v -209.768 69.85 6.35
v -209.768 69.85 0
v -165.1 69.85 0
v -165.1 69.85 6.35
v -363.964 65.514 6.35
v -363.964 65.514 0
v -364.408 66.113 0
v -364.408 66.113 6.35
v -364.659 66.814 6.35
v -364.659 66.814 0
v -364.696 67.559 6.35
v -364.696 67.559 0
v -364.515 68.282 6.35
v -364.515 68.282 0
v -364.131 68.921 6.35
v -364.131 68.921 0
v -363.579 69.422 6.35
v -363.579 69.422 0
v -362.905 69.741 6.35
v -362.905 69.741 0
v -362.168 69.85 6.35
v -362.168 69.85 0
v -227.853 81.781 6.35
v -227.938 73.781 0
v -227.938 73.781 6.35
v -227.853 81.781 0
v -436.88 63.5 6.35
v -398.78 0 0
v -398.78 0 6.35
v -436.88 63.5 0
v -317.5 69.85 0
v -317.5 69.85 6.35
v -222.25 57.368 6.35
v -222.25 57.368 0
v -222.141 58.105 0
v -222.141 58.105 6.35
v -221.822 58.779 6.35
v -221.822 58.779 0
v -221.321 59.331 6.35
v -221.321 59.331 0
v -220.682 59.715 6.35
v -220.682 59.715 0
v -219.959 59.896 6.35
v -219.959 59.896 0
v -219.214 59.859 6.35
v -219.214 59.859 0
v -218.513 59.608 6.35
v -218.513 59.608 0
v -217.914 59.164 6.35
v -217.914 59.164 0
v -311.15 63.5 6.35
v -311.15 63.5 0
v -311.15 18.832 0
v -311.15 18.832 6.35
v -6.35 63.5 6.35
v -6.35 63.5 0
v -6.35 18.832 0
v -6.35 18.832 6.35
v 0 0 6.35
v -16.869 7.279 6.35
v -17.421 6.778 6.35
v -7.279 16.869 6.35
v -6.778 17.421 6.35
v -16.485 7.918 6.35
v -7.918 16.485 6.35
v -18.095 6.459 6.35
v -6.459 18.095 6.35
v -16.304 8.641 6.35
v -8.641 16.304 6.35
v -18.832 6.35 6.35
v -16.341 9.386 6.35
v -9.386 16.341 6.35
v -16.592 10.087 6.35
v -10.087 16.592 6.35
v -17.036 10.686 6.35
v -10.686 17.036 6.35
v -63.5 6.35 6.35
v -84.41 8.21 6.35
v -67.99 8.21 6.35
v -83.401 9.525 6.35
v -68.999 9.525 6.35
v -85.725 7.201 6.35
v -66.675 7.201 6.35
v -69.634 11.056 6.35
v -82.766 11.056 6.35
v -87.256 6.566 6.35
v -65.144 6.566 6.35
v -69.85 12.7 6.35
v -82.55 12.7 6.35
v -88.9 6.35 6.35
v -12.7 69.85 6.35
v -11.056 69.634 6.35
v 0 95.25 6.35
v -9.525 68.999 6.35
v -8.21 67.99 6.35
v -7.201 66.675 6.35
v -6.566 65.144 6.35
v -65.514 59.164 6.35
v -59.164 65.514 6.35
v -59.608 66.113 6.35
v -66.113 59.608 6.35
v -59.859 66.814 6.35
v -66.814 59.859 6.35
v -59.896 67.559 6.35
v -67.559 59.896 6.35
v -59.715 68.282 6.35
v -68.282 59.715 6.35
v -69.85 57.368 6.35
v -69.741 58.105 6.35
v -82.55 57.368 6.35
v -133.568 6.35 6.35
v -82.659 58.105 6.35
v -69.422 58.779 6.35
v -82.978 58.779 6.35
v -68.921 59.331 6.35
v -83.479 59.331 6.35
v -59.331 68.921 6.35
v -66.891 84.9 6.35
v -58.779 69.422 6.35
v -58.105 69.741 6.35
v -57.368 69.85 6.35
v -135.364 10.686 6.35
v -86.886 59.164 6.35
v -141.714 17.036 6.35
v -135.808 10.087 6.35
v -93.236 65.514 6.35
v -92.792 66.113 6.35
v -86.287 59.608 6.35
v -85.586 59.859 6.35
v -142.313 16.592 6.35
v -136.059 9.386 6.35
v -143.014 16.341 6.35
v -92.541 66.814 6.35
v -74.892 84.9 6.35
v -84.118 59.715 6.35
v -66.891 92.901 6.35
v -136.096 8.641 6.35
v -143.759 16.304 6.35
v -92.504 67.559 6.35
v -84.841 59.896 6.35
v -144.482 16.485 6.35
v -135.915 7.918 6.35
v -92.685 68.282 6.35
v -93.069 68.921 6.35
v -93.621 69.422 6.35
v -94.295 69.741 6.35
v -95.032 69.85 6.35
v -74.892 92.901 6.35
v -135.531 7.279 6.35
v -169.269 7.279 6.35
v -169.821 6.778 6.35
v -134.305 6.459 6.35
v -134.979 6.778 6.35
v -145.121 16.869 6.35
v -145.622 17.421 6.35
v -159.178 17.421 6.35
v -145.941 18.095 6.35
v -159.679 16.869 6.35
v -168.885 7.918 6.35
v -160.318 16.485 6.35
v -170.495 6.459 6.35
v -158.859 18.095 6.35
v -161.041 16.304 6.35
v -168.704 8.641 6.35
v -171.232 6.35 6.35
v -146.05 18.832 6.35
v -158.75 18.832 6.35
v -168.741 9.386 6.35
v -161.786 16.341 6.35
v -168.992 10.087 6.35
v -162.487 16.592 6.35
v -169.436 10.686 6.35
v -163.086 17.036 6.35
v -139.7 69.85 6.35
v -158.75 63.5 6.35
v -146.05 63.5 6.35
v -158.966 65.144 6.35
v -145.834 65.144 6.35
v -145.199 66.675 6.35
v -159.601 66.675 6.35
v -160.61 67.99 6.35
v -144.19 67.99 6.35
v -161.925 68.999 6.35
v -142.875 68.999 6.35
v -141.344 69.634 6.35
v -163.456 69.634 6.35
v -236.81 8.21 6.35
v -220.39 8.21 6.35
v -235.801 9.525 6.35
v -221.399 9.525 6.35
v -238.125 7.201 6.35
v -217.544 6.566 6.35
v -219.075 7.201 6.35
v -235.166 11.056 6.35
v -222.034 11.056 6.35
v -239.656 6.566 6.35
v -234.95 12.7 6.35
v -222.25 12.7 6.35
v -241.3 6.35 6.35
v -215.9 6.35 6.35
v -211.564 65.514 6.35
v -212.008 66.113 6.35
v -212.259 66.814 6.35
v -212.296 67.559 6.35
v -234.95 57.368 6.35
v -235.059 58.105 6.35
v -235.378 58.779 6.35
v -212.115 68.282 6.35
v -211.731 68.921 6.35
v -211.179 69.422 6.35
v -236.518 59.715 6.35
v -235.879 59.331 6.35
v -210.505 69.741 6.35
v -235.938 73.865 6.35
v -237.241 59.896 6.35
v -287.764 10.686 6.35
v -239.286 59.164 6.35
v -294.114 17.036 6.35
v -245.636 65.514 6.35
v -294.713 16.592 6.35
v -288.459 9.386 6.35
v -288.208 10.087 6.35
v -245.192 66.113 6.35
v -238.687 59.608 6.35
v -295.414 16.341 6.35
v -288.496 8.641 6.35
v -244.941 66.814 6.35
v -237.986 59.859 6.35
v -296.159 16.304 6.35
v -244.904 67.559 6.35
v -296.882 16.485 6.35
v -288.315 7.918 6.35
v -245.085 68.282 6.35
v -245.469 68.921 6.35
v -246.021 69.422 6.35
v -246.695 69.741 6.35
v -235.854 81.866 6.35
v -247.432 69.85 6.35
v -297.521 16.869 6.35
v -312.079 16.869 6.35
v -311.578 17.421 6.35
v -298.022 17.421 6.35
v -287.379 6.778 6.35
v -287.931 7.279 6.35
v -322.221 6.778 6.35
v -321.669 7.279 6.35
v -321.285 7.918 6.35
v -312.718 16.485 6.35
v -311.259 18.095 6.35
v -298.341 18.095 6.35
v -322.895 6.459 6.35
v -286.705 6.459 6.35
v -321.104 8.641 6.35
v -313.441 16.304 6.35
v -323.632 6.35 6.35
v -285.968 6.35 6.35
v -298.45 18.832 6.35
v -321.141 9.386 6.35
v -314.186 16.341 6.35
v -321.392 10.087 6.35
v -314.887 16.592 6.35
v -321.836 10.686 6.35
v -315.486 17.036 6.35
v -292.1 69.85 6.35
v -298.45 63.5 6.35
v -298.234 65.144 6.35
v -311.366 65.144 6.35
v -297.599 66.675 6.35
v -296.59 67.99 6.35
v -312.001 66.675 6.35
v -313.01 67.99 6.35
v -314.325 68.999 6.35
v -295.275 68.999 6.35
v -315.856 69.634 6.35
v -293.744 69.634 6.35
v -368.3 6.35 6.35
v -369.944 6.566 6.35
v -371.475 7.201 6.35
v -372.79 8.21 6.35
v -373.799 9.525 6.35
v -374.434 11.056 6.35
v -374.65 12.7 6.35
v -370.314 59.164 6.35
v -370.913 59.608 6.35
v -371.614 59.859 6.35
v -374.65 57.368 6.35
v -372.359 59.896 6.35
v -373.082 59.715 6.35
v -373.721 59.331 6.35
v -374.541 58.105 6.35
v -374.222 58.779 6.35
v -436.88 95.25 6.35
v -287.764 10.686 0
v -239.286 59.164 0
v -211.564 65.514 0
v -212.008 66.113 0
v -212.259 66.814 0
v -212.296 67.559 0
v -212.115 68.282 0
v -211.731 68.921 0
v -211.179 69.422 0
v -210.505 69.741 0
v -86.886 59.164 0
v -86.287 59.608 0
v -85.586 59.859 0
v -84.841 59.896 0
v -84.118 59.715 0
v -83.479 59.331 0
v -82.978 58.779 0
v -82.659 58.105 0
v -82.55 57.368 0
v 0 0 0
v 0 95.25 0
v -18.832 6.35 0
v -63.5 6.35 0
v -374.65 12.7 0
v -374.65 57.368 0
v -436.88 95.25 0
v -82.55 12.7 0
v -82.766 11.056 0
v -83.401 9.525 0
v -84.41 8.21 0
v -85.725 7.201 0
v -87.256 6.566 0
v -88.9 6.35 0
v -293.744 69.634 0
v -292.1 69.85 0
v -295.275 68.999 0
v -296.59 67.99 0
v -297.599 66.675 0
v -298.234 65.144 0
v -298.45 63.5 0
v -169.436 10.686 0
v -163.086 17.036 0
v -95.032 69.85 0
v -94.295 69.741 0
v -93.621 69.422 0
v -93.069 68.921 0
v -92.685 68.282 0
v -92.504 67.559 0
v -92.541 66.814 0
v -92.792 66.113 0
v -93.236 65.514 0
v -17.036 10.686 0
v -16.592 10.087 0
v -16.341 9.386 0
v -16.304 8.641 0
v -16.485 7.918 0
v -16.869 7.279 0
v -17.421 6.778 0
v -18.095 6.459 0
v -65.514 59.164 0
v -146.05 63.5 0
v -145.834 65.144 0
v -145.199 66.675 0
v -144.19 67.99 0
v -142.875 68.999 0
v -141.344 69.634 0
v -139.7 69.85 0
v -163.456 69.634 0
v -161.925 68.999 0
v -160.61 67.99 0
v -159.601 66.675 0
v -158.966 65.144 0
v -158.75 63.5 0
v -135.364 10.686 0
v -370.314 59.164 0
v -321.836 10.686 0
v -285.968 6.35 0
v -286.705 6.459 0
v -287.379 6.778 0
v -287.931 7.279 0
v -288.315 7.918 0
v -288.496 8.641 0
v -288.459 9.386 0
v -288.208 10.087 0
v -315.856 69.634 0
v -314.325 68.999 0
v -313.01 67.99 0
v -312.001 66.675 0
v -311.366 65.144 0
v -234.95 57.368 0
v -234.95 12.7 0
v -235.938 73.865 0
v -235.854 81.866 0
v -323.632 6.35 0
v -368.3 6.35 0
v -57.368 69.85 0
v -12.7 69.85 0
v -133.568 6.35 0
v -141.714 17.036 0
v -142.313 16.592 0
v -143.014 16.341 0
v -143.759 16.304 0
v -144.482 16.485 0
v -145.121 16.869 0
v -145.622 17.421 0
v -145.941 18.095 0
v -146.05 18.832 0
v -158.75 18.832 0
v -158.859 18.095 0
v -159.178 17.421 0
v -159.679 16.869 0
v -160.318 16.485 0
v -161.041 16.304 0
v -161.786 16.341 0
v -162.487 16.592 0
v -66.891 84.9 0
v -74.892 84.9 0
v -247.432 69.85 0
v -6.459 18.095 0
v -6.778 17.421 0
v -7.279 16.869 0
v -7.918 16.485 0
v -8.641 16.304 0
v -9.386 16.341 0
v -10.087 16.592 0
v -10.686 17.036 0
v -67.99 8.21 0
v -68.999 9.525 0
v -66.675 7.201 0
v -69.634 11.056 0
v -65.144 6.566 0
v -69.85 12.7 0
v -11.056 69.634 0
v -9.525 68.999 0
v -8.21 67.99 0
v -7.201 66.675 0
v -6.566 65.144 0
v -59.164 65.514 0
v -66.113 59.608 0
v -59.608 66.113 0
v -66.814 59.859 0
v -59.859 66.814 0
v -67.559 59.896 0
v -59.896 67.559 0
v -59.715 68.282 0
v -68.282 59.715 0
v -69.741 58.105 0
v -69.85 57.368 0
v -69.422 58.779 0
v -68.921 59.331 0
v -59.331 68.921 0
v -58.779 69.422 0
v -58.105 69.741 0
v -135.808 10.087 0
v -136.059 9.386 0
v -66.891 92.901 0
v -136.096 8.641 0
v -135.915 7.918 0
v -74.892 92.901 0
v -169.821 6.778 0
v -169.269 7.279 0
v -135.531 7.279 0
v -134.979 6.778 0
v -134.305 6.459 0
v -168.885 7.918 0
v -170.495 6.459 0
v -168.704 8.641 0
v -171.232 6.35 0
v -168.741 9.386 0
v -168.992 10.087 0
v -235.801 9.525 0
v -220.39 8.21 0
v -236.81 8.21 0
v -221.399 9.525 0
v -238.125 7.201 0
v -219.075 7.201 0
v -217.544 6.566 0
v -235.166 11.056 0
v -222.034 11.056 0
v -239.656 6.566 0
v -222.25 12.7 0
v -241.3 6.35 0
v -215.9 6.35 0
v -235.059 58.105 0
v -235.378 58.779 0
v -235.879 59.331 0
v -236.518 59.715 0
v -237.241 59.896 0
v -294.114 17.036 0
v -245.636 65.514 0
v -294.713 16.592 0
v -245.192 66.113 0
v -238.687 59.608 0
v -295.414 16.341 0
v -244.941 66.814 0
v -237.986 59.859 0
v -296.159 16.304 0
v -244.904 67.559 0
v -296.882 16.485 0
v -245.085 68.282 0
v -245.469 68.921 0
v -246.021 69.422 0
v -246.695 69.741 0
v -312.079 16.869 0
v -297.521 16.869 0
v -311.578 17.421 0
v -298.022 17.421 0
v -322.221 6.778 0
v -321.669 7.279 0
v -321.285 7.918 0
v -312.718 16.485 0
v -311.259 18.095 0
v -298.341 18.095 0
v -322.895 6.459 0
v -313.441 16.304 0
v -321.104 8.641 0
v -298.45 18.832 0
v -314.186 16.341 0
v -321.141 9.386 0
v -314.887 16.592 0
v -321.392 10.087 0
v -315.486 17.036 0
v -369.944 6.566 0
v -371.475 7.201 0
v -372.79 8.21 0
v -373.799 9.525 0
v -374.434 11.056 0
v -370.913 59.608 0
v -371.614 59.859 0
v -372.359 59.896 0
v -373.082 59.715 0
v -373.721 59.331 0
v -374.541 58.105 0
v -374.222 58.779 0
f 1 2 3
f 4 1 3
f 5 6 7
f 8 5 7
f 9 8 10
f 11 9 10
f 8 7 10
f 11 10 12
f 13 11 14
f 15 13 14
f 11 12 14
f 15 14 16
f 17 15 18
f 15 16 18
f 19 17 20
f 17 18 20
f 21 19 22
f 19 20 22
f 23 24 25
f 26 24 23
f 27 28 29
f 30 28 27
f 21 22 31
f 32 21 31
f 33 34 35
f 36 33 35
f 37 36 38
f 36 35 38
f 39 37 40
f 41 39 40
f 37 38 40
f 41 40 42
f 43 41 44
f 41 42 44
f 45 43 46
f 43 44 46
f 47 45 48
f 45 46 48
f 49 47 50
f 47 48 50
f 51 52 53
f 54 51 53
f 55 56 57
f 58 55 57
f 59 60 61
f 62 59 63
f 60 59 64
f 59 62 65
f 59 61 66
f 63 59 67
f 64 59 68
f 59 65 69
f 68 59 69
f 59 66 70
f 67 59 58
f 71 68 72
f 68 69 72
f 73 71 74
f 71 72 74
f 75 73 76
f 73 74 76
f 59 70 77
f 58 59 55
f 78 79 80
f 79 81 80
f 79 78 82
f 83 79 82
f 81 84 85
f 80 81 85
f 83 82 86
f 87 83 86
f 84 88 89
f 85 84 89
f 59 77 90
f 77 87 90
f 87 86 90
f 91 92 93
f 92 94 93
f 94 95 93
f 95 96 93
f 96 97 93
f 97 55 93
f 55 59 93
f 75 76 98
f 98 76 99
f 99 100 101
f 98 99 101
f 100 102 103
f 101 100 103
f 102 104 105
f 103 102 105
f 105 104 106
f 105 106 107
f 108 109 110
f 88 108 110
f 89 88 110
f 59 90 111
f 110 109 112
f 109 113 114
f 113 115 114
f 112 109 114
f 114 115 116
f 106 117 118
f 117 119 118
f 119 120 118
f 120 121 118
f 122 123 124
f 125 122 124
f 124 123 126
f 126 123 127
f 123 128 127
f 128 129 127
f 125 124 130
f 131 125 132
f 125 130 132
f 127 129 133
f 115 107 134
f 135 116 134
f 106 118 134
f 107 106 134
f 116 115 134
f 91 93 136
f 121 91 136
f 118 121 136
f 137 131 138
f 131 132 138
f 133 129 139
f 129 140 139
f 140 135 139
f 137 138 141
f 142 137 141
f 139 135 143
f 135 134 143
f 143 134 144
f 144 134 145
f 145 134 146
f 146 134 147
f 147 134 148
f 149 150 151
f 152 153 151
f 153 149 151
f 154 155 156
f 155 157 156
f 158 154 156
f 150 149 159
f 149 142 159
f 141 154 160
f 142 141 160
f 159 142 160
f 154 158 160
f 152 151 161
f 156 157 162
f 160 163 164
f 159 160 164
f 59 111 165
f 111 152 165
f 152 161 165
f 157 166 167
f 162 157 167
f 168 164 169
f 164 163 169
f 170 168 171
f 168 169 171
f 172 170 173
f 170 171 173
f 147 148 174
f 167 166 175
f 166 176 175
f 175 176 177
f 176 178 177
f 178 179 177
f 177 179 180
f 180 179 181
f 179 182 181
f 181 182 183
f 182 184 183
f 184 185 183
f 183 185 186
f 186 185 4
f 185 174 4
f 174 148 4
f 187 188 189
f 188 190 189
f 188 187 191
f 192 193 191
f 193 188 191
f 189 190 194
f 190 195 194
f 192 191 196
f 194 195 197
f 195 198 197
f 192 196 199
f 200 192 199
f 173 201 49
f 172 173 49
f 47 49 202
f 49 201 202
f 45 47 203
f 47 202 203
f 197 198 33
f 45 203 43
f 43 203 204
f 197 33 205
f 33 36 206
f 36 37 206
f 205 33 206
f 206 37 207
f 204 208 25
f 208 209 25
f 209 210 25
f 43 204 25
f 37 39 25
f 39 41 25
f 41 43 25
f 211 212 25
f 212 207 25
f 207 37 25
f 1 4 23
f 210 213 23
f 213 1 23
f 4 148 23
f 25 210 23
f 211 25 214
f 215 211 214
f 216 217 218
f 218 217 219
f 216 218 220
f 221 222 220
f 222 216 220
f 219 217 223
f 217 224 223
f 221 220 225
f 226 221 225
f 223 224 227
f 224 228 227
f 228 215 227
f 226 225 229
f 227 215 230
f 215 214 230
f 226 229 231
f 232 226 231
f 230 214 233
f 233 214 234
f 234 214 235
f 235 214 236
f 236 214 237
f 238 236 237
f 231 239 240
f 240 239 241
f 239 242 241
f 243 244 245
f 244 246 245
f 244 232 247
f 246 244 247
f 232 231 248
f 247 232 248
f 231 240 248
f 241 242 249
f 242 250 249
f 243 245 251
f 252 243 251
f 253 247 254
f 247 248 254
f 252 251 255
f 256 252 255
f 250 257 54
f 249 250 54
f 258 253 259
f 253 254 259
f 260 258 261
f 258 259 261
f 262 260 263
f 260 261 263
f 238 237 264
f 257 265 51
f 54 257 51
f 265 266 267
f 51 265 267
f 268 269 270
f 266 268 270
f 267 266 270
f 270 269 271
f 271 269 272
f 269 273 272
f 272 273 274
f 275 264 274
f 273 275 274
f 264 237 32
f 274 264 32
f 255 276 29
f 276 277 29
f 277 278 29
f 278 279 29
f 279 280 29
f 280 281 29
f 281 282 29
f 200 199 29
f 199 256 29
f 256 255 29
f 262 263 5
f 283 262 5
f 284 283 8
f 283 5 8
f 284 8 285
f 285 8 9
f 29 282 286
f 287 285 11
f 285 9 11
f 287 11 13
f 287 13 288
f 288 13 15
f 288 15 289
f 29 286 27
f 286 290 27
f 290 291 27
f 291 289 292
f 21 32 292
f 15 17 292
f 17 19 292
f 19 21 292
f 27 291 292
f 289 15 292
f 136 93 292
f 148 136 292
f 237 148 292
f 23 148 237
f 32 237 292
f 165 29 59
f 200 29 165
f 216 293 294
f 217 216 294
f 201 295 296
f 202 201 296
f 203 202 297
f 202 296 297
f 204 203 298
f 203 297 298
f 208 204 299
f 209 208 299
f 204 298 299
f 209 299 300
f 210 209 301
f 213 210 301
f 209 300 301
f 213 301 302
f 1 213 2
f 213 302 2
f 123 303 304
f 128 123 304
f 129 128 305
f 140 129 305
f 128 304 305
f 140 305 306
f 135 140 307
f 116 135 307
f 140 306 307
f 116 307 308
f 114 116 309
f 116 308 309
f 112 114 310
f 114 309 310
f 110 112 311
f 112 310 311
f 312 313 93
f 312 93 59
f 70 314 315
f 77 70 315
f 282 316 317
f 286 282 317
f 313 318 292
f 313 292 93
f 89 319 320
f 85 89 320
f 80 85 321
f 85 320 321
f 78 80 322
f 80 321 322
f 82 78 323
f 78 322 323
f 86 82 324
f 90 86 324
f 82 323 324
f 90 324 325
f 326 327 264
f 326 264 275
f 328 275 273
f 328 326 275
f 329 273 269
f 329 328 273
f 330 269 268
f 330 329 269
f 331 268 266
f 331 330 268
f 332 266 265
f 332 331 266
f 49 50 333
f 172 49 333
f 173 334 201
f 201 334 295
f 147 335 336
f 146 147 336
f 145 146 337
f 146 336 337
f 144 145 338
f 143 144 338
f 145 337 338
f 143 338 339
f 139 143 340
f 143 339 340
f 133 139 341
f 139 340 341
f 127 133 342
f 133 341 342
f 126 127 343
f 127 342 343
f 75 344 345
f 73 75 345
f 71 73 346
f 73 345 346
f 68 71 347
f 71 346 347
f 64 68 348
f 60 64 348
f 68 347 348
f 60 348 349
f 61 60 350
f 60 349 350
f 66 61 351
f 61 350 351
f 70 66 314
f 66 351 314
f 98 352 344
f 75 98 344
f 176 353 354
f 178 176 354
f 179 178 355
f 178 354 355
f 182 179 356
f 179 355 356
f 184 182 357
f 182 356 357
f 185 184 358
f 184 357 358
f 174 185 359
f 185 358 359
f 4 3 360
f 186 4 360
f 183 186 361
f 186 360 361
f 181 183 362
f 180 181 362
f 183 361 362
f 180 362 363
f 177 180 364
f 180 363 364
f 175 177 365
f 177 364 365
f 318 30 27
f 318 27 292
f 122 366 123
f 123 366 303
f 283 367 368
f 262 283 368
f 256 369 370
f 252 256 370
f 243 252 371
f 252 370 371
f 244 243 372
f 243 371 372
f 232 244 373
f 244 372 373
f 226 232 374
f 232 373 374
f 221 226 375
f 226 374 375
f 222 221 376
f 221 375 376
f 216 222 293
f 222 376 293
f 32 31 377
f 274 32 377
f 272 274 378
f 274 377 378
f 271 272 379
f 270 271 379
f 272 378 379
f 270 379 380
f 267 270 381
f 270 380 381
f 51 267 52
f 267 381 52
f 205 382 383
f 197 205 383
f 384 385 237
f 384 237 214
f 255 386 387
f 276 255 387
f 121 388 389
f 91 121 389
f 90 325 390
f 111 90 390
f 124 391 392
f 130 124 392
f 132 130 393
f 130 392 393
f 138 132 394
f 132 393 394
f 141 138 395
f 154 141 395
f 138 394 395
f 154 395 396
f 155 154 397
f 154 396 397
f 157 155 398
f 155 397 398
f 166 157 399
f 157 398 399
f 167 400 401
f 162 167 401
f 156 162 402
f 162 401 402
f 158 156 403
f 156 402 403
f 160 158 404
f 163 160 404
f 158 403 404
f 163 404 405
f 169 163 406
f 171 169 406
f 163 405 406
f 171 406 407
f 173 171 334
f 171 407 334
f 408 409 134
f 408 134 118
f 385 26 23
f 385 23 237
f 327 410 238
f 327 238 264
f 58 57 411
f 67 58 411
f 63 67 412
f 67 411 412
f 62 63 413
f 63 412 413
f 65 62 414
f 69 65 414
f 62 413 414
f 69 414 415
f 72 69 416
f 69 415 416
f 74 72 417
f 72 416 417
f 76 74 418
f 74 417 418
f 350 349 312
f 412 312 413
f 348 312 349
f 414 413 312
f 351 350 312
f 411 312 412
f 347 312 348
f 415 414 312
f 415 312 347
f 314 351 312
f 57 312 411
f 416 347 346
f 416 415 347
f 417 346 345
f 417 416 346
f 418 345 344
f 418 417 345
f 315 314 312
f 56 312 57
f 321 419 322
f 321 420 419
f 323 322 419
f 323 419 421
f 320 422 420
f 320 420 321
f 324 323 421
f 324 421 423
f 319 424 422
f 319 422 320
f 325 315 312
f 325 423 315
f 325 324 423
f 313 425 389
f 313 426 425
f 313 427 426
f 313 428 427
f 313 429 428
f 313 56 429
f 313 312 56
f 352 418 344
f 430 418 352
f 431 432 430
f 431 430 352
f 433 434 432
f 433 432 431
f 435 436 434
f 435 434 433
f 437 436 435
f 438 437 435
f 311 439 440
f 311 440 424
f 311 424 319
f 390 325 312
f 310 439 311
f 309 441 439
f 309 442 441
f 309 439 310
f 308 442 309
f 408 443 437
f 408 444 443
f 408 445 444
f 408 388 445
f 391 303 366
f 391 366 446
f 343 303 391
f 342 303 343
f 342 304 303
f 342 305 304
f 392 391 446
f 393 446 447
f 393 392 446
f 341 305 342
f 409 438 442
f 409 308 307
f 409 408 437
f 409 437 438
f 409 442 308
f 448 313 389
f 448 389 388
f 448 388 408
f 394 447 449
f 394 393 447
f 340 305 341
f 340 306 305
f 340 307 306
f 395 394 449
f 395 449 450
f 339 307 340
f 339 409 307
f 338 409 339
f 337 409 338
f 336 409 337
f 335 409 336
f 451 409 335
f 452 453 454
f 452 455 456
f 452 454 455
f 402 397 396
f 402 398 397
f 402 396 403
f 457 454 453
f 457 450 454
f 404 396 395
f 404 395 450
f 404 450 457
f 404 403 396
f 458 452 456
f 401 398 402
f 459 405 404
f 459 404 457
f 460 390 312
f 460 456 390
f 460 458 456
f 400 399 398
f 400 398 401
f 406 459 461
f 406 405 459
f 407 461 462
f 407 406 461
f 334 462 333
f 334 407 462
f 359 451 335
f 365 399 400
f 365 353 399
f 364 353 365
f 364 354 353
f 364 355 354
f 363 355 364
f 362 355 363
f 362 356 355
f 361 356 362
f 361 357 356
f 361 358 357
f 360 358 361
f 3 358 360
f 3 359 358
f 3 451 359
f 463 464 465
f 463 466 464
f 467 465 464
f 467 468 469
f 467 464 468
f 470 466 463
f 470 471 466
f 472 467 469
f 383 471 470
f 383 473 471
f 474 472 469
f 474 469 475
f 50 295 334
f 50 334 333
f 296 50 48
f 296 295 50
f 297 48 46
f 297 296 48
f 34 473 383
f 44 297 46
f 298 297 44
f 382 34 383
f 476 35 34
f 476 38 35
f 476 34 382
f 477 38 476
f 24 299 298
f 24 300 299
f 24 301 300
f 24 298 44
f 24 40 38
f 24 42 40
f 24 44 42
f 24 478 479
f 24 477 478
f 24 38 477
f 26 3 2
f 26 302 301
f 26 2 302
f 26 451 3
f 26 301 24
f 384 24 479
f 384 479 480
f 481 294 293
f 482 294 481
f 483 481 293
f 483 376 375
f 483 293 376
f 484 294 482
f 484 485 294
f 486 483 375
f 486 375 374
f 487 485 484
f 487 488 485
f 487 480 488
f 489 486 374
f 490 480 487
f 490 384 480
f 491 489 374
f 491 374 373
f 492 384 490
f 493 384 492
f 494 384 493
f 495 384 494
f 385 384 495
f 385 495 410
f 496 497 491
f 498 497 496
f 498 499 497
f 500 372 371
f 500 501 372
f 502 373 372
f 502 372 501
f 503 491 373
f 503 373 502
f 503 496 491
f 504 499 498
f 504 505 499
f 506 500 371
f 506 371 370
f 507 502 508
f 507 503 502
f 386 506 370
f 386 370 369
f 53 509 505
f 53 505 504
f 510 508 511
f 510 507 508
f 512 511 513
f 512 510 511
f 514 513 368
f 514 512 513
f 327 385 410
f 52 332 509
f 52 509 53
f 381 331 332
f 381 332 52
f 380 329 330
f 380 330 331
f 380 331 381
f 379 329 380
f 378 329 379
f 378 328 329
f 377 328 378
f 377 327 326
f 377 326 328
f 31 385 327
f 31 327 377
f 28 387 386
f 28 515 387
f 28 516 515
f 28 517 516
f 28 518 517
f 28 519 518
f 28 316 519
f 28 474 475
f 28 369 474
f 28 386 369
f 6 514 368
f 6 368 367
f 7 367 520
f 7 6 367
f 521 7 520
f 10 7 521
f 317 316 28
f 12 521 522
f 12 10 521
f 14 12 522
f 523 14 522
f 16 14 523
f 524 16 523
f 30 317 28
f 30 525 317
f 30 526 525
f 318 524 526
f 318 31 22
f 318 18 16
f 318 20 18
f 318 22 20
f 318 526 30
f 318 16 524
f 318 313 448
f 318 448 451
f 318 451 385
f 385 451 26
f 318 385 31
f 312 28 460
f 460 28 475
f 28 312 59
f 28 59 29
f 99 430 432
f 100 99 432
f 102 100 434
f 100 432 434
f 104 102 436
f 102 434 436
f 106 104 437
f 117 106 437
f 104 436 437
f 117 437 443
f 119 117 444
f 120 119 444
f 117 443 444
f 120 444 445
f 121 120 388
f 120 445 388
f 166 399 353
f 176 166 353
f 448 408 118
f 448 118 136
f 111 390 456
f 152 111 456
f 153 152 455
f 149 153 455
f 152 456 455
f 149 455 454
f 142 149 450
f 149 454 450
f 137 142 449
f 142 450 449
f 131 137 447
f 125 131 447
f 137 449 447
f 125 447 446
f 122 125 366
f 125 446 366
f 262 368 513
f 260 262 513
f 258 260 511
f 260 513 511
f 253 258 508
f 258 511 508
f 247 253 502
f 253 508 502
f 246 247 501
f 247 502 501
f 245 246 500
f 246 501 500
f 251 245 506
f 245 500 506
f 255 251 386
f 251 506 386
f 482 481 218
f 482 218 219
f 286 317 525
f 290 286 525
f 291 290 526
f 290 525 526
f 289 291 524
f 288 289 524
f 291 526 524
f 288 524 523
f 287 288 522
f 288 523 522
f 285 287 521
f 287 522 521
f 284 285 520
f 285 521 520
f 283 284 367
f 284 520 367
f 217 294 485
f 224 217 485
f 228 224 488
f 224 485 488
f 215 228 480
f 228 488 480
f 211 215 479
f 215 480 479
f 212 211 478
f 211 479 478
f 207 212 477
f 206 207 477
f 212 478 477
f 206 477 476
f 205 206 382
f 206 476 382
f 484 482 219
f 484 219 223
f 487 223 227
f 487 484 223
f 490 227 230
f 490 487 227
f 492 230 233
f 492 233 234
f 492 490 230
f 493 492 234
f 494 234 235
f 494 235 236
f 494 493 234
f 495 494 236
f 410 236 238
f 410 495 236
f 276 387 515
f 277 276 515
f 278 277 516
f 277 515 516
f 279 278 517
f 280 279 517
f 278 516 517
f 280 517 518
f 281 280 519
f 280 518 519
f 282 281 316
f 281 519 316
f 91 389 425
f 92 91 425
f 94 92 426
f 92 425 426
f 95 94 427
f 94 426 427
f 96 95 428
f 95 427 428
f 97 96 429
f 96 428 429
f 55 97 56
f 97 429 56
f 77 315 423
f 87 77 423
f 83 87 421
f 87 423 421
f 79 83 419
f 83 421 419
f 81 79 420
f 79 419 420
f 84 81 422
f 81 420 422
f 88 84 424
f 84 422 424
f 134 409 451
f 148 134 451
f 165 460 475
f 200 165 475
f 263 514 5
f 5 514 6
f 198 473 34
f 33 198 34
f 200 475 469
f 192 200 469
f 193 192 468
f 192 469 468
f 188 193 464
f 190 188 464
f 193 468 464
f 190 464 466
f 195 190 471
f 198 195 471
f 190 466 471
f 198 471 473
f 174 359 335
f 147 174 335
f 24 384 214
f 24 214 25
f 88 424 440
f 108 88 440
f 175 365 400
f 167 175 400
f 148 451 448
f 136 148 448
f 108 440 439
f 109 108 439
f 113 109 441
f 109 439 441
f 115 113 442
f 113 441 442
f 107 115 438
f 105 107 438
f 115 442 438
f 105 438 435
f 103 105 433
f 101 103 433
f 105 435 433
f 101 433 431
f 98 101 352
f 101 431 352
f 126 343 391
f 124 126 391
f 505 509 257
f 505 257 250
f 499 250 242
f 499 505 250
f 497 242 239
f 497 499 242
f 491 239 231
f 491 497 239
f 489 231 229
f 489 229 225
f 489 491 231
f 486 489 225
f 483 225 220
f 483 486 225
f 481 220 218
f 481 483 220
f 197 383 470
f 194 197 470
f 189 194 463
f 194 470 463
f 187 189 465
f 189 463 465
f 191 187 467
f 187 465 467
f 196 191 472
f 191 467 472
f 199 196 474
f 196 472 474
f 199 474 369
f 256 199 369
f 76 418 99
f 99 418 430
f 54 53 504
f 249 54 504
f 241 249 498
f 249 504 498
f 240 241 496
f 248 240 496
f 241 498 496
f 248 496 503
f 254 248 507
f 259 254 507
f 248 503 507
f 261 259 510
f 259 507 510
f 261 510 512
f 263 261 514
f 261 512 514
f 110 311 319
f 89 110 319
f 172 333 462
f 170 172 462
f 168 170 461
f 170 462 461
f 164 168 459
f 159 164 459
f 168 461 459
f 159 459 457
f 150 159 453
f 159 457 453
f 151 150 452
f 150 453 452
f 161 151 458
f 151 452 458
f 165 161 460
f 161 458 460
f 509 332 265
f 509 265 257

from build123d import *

# Parameters (mm, degrees)
MODEL_W             = 8.001
MODEL_H             = 8.001
BOSS_EXTRUDE1_DEPTH = 6.35


with BuildPart() as part:
    # Model → Boss-Extrude1 (new body)
    with BuildSketch(Plane.XY):
        Polygon((-398.78, 0), (-436.88, 63.5), (-436.88, 95.25), (0, 95.25), (0, 0), align=None)
        with Locations((-70.891200524, 88.9)):
            Rectangle(MODEL_W, MODEL_H, mode=Mode.SUBTRACT)
        Polygon((-235.938184475, 73.86541105), (-227.937630461, 73.78093355), (-227.853152962, 81.781487564), (-235.853706976, 81.865965064), align=None, mode=Mode.SUBTRACT)
        with BuildLine():
            Line((-171.232102448, 6.35), (-215.9, 6.35))
            ThreePointArc((-215.9, 6.35), (-220.390128061, 8.209871939), (-222.25, 12.7))
            Line((-222.25, 12.7), (-222.25, 57.367897552))
            ThreePointArc((-222.25, 57.367897552), (-220.682015918, 59.714551564), (-217.913948776, 59.163948776))
            Line((-217.913948776, 59.163948776), (-169.436051224, 10.686051224))
            ThreePointArc((-169.436051224, 10.686051224), (-168.885448436, 7.917984082), (-171.232102448, 6.35))
        make_face(mode=Mode.SUBTRACT)
        with BuildLine():
            Line((-234.95, 57.367897552), (-234.95, 12.7))
            ThreePointArc((-234.95, 12.7), (-236.809871939, 8.209871939), (-241.3, 6.35))
            Line((-241.3, 6.35), (-285.967897552, 6.35))
            ThreePointArc((-285.967897552, 6.35), (-288.314551564, 7.917984082), (-287.763948776, 10.686051224))
            Line((-287.763948776, 10.686051224), (-239.286051224, 59.163948776))
            ThreePointArc((-239.286051224, 59.163948776), (-236.517984082, 59.714551564), (-234.95, 57.367897552))
        make_face(mode=Mode.SUBTRACT)
        with BuildLine():
            Line((-294.113948776, 17.036051224), (-245.636051224, 65.513948776))
            ThreePointArc((-245.636051224, 65.513948776), (-245.085448436, 68.282015918), (-247.432102448, 69.85))
            Line((-247.432102448, 69.85), (-292.1, 69.85))
            ThreePointArc((-292.1, 69.85), (-296.590128061, 67.990128061), (-298.45, 63.5))
            Line((-298.45, 63.5), (-298.45, 18.832102448))
            ThreePointArc((-298.45, 18.832102448), (-296.882015918, 16.485448436), (-294.113948776, 17.036051224))
        make_face(mode=Mode.SUBTRACT)
        with BuildLine():
            Line((-323.632102448, 6.35), (-368.3, 6.35))
            ThreePointArc((-368.3, 6.35), (-372.790128061, 8.209871939), (-374.65, 12.7))
            Line((-374.65, 12.7), (-374.65, 57.367897552))
            ThreePointArc((-374.65, 57.367897552), (-373.082015918, 59.714551564), (-370.313948776, 59.163948776))
            Line((-370.313948776, 59.163948776), (-321.836051224, 10.686051224))
            ThreePointArc((-321.836051224, 10.686051224), (-321.285448436, 7.917984082), (-323.632102448, 6.35))
        make_face(mode=Mode.SUBTRACT)
        with BuildLine():
            Line((-18.832102448, 6.35), (-63.5, 6.35))
            ThreePointArc((-63.5, 6.35), (-67.990128061, 8.209871939), (-69.85, 12.7))
            Line((-69.85, 12.7), (-69.85, 57.367897552))
            ThreePointArc((-69.85, 57.367897552), (-68.282015918, 59.714551564), (-65.513948776, 59.163948776))
            Line((-65.513948776, 59.163948776), (-17.036051224, 10.686051224))
            ThreePointArc((-17.036051224, 10.686051224), (-16.485448436, 7.917984082), (-18.832102448, 6.35))
        make_face(mode=Mode.SUBTRACT)
        with BuildLine():
            Line((-82.55, 57.367897552), (-82.55, 12.7))
            ThreePointArc((-82.55, 12.7), (-84.409871939, 8.209871939), (-88.9, 6.35))
            Line((-88.9, 6.35), (-133.567897552, 6.35))
            ThreePointArc((-133.567897552, 6.35), (-135.914551564, 7.917984082), (-135.363948776, 10.686051224))
            Line((-135.363948776, 10.686051224), (-86.886051224, 59.163948776))
            ThreePointArc((-86.886051224, 59.163948776), (-84.117984082, 59.714551564), (-82.55, 57.367897552))
        make_face(mode=Mode.SUBTRACT)
        with BuildLine():
            Line((-93.236051224, 65.513948776), (-141.713948776, 17.036051224))
            ThreePointArc((-141.713948776, 17.036051224), (-144.482015918, 16.485448436), (-146.05, 18.832102448))
            Line((-146.05, 18.832102448), (-146.05, 63.5))
            ThreePointArc((-146.05, 63.5), (-144.190128061, 67.990128061), (-139.7, 69.85))
            Line((-139.7, 69.85), (-95.032102448, 69.85))
            ThreePointArc((-95.032102448, 69.85), (-92.685448436, 68.282015918), (-93.236051224, 65.513948776))
        make_face(mode=Mode.SUBTRACT)
        with BuildLine():
            Line((-163.086051224, 17.036051224), (-211.563948776, 65.513948776))
            ThreePointArc((-211.563948776, 65.513948776), (-212.114551564, 68.282015918), (-209.767897552, 69.85))
            Line((-209.767897552, 69.85), (-165.1, 69.85))
            ThreePointArc((-165.1, 69.85), (-160.609871939, 67.990128061), (-158.75, 63.5))
            Line((-158.75, 63.5), (-158.75, 18.832102448))
            ThreePointArc((-158.75, 18.832102448), (-160.317984082, 16.485448436), (-163.086051224, 17.036051224))
        make_face(mode=Mode.SUBTRACT)
        with BuildLine():
            Line((-315.486051224, 17.036051224), (-363.963948776, 65.513948776))
            ThreePointArc((-363.963948776, 65.513948776), (-364.514551564, 68.282015918), (-362.167897552, 69.85))
            Line((-362.167897552, 69.85), (-317.5, 69.85))
            ThreePointArc((-317.5, 69.85), (-313.009871939, 67.990128061), (-311.15, 63.5))
            Line((-311.15, 63.5), (-311.15, 18.832102448))
            ThreePointArc((-311.15, 18.832102448), (-312.717984082, 16.485448436), (-315.486051224, 17.036051224))
        make_face(mode=Mode.SUBTRACT)
        with BuildLine():
            Line((-6.35, 63.5), (-6.35, 18.832102448))
            ThreePointArc((-6.35, 18.832102448), (-7.917984082, 16.485448436), (-10.686051224, 17.036051224))
            Line((-10.686051224, 17.036051224), (-59.163948776, 65.513948776))
            ThreePointArc((-59.163948776, 65.513948776), (-59.714551564, 68.282015918), (-57.367897552, 69.85))
            Line((-57.367897552, 69.85), (-12.7, 69.85))
            ThreePointArc((-12.7, 69.85), (-8.209871939, 67.990128061), (-6.35, 63.5))
        make_face(mode=Mode.SUBTRACT)
    extrude(amount=BOSS_EXTRUDE1_DEPTH)


solid = part.part
